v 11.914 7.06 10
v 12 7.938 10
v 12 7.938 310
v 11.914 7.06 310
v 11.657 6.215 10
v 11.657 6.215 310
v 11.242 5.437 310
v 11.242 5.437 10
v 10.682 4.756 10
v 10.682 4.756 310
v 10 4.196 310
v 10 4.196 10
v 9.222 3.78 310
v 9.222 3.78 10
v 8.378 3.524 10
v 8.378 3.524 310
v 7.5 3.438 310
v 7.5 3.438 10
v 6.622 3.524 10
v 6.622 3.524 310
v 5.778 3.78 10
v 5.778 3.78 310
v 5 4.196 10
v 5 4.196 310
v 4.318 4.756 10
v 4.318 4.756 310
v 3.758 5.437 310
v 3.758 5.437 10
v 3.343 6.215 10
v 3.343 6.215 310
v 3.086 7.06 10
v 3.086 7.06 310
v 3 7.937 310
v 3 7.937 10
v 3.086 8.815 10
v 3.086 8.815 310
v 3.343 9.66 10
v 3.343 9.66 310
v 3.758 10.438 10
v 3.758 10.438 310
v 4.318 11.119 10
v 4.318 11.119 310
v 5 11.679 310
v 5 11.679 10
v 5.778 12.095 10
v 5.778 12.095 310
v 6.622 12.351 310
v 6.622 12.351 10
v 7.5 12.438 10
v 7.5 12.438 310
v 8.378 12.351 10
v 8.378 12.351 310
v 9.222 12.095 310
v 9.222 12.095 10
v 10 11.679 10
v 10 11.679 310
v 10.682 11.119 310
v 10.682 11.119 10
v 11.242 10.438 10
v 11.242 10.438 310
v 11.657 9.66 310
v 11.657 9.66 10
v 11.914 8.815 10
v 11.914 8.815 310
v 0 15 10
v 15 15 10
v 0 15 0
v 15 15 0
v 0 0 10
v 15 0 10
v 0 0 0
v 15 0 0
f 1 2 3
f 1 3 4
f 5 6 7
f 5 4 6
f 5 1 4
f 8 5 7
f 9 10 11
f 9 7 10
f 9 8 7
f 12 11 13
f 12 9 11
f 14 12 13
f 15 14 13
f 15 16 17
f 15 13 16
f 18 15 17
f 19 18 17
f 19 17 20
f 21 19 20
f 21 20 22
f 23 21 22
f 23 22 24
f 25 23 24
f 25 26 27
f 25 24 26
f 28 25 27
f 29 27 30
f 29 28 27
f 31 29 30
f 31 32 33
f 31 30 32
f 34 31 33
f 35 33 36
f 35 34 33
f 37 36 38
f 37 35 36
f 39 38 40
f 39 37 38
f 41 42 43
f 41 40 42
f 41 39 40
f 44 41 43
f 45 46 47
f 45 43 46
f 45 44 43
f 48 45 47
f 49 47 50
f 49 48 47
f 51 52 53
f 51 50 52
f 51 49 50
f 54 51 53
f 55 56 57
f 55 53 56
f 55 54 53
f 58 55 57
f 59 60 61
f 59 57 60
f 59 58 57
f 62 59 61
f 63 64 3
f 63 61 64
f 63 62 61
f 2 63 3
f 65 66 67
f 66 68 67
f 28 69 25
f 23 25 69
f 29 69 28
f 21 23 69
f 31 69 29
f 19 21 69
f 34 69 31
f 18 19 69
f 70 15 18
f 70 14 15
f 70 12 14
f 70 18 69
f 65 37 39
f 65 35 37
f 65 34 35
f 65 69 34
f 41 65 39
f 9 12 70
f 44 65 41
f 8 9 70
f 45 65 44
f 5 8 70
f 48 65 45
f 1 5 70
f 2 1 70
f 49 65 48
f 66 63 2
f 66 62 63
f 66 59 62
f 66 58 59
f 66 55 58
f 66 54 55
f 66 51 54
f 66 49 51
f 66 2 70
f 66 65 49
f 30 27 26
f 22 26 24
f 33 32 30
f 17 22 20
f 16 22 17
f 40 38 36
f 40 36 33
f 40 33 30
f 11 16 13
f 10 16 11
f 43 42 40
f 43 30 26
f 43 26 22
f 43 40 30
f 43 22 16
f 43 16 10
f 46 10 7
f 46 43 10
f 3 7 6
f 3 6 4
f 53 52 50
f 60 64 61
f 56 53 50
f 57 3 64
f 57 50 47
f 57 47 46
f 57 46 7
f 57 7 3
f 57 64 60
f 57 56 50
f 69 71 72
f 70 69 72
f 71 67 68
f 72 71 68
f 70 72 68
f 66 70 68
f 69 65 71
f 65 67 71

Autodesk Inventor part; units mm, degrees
ref_plane "YZ Plane" through (0, 0, 0) normal (1, 0, 0) x (0, 1, 0)
ref_plane "XZ Plane" through (0, 0, 0) normal (0, 1, 0) x (-1, 0, 0)
ref_plane "XY Plane" through (0, 0, 0) normal (0, 0, 1) x (1, 0, 0)
sketch "Sketch1" plane through (0, 0, 0) normal (0, 0, 1) x (1, 0, 0)
  line L0 (0, 0) -> (15, 0)
  line L1 (15, 0) -> (15, 15)
  line L2 (15, 15) -> (0, 15)
  line L3 (0, 15) -> (0, 0)
  dimension "d0" = 15
  dimension "d1" = 15
extrude "Extrusion1" add sketch "Sketch1" along normal blind 10
sketch "Sketch2" plane through (0, 0, 10) normal (0, 0, 1) x (1, 0, 0)
  line L0 (0, 15) -> (7.1003, 15)
  line L1 (15, 15) -> (0, 15) projected
  line L2 (7.5, 15) -> (7.5, 0)
  line L3 (0, 15) -> (7.9375, 15)
  line L4 (0, 0) -> (0, 7.9375)
  line L5 (0, 7.9375) -> (15, 7.9375)
  circle A0 centre (7.5, 7.9375) radius 4.5
  dimension "d15" = 9
extrude "Extrusion2" add sketch "Sketch2" along normal blind 250
thread "Thread1" size "M11x1.5" class "6g" standard "ANSI Metric M Profile" full length
ref_plane "Work Plane1" through (7.5, 7.9375, 260) normal (0, 0, 1) x (1, 0, 0)
sketch "Sketch3" plane through (7.5, 7.9375, 260) normal (0, 0, 1) x (1, 0, 0)
  circle A0 centre (0, 0) radius 5.5 projected
  circle A1 centre (0, 0) radius 4.5
  point P0 (-7.5, -7.9375)
  dimension "d10" = 9
extrude "Extrusion3" add sketch "Sketch3" along normal blind 50 contours A1
thread "Thread2" size "M9x1.25" class "6g" standard "ANSI Metric M Profile" full length
properties part number "nut1"
